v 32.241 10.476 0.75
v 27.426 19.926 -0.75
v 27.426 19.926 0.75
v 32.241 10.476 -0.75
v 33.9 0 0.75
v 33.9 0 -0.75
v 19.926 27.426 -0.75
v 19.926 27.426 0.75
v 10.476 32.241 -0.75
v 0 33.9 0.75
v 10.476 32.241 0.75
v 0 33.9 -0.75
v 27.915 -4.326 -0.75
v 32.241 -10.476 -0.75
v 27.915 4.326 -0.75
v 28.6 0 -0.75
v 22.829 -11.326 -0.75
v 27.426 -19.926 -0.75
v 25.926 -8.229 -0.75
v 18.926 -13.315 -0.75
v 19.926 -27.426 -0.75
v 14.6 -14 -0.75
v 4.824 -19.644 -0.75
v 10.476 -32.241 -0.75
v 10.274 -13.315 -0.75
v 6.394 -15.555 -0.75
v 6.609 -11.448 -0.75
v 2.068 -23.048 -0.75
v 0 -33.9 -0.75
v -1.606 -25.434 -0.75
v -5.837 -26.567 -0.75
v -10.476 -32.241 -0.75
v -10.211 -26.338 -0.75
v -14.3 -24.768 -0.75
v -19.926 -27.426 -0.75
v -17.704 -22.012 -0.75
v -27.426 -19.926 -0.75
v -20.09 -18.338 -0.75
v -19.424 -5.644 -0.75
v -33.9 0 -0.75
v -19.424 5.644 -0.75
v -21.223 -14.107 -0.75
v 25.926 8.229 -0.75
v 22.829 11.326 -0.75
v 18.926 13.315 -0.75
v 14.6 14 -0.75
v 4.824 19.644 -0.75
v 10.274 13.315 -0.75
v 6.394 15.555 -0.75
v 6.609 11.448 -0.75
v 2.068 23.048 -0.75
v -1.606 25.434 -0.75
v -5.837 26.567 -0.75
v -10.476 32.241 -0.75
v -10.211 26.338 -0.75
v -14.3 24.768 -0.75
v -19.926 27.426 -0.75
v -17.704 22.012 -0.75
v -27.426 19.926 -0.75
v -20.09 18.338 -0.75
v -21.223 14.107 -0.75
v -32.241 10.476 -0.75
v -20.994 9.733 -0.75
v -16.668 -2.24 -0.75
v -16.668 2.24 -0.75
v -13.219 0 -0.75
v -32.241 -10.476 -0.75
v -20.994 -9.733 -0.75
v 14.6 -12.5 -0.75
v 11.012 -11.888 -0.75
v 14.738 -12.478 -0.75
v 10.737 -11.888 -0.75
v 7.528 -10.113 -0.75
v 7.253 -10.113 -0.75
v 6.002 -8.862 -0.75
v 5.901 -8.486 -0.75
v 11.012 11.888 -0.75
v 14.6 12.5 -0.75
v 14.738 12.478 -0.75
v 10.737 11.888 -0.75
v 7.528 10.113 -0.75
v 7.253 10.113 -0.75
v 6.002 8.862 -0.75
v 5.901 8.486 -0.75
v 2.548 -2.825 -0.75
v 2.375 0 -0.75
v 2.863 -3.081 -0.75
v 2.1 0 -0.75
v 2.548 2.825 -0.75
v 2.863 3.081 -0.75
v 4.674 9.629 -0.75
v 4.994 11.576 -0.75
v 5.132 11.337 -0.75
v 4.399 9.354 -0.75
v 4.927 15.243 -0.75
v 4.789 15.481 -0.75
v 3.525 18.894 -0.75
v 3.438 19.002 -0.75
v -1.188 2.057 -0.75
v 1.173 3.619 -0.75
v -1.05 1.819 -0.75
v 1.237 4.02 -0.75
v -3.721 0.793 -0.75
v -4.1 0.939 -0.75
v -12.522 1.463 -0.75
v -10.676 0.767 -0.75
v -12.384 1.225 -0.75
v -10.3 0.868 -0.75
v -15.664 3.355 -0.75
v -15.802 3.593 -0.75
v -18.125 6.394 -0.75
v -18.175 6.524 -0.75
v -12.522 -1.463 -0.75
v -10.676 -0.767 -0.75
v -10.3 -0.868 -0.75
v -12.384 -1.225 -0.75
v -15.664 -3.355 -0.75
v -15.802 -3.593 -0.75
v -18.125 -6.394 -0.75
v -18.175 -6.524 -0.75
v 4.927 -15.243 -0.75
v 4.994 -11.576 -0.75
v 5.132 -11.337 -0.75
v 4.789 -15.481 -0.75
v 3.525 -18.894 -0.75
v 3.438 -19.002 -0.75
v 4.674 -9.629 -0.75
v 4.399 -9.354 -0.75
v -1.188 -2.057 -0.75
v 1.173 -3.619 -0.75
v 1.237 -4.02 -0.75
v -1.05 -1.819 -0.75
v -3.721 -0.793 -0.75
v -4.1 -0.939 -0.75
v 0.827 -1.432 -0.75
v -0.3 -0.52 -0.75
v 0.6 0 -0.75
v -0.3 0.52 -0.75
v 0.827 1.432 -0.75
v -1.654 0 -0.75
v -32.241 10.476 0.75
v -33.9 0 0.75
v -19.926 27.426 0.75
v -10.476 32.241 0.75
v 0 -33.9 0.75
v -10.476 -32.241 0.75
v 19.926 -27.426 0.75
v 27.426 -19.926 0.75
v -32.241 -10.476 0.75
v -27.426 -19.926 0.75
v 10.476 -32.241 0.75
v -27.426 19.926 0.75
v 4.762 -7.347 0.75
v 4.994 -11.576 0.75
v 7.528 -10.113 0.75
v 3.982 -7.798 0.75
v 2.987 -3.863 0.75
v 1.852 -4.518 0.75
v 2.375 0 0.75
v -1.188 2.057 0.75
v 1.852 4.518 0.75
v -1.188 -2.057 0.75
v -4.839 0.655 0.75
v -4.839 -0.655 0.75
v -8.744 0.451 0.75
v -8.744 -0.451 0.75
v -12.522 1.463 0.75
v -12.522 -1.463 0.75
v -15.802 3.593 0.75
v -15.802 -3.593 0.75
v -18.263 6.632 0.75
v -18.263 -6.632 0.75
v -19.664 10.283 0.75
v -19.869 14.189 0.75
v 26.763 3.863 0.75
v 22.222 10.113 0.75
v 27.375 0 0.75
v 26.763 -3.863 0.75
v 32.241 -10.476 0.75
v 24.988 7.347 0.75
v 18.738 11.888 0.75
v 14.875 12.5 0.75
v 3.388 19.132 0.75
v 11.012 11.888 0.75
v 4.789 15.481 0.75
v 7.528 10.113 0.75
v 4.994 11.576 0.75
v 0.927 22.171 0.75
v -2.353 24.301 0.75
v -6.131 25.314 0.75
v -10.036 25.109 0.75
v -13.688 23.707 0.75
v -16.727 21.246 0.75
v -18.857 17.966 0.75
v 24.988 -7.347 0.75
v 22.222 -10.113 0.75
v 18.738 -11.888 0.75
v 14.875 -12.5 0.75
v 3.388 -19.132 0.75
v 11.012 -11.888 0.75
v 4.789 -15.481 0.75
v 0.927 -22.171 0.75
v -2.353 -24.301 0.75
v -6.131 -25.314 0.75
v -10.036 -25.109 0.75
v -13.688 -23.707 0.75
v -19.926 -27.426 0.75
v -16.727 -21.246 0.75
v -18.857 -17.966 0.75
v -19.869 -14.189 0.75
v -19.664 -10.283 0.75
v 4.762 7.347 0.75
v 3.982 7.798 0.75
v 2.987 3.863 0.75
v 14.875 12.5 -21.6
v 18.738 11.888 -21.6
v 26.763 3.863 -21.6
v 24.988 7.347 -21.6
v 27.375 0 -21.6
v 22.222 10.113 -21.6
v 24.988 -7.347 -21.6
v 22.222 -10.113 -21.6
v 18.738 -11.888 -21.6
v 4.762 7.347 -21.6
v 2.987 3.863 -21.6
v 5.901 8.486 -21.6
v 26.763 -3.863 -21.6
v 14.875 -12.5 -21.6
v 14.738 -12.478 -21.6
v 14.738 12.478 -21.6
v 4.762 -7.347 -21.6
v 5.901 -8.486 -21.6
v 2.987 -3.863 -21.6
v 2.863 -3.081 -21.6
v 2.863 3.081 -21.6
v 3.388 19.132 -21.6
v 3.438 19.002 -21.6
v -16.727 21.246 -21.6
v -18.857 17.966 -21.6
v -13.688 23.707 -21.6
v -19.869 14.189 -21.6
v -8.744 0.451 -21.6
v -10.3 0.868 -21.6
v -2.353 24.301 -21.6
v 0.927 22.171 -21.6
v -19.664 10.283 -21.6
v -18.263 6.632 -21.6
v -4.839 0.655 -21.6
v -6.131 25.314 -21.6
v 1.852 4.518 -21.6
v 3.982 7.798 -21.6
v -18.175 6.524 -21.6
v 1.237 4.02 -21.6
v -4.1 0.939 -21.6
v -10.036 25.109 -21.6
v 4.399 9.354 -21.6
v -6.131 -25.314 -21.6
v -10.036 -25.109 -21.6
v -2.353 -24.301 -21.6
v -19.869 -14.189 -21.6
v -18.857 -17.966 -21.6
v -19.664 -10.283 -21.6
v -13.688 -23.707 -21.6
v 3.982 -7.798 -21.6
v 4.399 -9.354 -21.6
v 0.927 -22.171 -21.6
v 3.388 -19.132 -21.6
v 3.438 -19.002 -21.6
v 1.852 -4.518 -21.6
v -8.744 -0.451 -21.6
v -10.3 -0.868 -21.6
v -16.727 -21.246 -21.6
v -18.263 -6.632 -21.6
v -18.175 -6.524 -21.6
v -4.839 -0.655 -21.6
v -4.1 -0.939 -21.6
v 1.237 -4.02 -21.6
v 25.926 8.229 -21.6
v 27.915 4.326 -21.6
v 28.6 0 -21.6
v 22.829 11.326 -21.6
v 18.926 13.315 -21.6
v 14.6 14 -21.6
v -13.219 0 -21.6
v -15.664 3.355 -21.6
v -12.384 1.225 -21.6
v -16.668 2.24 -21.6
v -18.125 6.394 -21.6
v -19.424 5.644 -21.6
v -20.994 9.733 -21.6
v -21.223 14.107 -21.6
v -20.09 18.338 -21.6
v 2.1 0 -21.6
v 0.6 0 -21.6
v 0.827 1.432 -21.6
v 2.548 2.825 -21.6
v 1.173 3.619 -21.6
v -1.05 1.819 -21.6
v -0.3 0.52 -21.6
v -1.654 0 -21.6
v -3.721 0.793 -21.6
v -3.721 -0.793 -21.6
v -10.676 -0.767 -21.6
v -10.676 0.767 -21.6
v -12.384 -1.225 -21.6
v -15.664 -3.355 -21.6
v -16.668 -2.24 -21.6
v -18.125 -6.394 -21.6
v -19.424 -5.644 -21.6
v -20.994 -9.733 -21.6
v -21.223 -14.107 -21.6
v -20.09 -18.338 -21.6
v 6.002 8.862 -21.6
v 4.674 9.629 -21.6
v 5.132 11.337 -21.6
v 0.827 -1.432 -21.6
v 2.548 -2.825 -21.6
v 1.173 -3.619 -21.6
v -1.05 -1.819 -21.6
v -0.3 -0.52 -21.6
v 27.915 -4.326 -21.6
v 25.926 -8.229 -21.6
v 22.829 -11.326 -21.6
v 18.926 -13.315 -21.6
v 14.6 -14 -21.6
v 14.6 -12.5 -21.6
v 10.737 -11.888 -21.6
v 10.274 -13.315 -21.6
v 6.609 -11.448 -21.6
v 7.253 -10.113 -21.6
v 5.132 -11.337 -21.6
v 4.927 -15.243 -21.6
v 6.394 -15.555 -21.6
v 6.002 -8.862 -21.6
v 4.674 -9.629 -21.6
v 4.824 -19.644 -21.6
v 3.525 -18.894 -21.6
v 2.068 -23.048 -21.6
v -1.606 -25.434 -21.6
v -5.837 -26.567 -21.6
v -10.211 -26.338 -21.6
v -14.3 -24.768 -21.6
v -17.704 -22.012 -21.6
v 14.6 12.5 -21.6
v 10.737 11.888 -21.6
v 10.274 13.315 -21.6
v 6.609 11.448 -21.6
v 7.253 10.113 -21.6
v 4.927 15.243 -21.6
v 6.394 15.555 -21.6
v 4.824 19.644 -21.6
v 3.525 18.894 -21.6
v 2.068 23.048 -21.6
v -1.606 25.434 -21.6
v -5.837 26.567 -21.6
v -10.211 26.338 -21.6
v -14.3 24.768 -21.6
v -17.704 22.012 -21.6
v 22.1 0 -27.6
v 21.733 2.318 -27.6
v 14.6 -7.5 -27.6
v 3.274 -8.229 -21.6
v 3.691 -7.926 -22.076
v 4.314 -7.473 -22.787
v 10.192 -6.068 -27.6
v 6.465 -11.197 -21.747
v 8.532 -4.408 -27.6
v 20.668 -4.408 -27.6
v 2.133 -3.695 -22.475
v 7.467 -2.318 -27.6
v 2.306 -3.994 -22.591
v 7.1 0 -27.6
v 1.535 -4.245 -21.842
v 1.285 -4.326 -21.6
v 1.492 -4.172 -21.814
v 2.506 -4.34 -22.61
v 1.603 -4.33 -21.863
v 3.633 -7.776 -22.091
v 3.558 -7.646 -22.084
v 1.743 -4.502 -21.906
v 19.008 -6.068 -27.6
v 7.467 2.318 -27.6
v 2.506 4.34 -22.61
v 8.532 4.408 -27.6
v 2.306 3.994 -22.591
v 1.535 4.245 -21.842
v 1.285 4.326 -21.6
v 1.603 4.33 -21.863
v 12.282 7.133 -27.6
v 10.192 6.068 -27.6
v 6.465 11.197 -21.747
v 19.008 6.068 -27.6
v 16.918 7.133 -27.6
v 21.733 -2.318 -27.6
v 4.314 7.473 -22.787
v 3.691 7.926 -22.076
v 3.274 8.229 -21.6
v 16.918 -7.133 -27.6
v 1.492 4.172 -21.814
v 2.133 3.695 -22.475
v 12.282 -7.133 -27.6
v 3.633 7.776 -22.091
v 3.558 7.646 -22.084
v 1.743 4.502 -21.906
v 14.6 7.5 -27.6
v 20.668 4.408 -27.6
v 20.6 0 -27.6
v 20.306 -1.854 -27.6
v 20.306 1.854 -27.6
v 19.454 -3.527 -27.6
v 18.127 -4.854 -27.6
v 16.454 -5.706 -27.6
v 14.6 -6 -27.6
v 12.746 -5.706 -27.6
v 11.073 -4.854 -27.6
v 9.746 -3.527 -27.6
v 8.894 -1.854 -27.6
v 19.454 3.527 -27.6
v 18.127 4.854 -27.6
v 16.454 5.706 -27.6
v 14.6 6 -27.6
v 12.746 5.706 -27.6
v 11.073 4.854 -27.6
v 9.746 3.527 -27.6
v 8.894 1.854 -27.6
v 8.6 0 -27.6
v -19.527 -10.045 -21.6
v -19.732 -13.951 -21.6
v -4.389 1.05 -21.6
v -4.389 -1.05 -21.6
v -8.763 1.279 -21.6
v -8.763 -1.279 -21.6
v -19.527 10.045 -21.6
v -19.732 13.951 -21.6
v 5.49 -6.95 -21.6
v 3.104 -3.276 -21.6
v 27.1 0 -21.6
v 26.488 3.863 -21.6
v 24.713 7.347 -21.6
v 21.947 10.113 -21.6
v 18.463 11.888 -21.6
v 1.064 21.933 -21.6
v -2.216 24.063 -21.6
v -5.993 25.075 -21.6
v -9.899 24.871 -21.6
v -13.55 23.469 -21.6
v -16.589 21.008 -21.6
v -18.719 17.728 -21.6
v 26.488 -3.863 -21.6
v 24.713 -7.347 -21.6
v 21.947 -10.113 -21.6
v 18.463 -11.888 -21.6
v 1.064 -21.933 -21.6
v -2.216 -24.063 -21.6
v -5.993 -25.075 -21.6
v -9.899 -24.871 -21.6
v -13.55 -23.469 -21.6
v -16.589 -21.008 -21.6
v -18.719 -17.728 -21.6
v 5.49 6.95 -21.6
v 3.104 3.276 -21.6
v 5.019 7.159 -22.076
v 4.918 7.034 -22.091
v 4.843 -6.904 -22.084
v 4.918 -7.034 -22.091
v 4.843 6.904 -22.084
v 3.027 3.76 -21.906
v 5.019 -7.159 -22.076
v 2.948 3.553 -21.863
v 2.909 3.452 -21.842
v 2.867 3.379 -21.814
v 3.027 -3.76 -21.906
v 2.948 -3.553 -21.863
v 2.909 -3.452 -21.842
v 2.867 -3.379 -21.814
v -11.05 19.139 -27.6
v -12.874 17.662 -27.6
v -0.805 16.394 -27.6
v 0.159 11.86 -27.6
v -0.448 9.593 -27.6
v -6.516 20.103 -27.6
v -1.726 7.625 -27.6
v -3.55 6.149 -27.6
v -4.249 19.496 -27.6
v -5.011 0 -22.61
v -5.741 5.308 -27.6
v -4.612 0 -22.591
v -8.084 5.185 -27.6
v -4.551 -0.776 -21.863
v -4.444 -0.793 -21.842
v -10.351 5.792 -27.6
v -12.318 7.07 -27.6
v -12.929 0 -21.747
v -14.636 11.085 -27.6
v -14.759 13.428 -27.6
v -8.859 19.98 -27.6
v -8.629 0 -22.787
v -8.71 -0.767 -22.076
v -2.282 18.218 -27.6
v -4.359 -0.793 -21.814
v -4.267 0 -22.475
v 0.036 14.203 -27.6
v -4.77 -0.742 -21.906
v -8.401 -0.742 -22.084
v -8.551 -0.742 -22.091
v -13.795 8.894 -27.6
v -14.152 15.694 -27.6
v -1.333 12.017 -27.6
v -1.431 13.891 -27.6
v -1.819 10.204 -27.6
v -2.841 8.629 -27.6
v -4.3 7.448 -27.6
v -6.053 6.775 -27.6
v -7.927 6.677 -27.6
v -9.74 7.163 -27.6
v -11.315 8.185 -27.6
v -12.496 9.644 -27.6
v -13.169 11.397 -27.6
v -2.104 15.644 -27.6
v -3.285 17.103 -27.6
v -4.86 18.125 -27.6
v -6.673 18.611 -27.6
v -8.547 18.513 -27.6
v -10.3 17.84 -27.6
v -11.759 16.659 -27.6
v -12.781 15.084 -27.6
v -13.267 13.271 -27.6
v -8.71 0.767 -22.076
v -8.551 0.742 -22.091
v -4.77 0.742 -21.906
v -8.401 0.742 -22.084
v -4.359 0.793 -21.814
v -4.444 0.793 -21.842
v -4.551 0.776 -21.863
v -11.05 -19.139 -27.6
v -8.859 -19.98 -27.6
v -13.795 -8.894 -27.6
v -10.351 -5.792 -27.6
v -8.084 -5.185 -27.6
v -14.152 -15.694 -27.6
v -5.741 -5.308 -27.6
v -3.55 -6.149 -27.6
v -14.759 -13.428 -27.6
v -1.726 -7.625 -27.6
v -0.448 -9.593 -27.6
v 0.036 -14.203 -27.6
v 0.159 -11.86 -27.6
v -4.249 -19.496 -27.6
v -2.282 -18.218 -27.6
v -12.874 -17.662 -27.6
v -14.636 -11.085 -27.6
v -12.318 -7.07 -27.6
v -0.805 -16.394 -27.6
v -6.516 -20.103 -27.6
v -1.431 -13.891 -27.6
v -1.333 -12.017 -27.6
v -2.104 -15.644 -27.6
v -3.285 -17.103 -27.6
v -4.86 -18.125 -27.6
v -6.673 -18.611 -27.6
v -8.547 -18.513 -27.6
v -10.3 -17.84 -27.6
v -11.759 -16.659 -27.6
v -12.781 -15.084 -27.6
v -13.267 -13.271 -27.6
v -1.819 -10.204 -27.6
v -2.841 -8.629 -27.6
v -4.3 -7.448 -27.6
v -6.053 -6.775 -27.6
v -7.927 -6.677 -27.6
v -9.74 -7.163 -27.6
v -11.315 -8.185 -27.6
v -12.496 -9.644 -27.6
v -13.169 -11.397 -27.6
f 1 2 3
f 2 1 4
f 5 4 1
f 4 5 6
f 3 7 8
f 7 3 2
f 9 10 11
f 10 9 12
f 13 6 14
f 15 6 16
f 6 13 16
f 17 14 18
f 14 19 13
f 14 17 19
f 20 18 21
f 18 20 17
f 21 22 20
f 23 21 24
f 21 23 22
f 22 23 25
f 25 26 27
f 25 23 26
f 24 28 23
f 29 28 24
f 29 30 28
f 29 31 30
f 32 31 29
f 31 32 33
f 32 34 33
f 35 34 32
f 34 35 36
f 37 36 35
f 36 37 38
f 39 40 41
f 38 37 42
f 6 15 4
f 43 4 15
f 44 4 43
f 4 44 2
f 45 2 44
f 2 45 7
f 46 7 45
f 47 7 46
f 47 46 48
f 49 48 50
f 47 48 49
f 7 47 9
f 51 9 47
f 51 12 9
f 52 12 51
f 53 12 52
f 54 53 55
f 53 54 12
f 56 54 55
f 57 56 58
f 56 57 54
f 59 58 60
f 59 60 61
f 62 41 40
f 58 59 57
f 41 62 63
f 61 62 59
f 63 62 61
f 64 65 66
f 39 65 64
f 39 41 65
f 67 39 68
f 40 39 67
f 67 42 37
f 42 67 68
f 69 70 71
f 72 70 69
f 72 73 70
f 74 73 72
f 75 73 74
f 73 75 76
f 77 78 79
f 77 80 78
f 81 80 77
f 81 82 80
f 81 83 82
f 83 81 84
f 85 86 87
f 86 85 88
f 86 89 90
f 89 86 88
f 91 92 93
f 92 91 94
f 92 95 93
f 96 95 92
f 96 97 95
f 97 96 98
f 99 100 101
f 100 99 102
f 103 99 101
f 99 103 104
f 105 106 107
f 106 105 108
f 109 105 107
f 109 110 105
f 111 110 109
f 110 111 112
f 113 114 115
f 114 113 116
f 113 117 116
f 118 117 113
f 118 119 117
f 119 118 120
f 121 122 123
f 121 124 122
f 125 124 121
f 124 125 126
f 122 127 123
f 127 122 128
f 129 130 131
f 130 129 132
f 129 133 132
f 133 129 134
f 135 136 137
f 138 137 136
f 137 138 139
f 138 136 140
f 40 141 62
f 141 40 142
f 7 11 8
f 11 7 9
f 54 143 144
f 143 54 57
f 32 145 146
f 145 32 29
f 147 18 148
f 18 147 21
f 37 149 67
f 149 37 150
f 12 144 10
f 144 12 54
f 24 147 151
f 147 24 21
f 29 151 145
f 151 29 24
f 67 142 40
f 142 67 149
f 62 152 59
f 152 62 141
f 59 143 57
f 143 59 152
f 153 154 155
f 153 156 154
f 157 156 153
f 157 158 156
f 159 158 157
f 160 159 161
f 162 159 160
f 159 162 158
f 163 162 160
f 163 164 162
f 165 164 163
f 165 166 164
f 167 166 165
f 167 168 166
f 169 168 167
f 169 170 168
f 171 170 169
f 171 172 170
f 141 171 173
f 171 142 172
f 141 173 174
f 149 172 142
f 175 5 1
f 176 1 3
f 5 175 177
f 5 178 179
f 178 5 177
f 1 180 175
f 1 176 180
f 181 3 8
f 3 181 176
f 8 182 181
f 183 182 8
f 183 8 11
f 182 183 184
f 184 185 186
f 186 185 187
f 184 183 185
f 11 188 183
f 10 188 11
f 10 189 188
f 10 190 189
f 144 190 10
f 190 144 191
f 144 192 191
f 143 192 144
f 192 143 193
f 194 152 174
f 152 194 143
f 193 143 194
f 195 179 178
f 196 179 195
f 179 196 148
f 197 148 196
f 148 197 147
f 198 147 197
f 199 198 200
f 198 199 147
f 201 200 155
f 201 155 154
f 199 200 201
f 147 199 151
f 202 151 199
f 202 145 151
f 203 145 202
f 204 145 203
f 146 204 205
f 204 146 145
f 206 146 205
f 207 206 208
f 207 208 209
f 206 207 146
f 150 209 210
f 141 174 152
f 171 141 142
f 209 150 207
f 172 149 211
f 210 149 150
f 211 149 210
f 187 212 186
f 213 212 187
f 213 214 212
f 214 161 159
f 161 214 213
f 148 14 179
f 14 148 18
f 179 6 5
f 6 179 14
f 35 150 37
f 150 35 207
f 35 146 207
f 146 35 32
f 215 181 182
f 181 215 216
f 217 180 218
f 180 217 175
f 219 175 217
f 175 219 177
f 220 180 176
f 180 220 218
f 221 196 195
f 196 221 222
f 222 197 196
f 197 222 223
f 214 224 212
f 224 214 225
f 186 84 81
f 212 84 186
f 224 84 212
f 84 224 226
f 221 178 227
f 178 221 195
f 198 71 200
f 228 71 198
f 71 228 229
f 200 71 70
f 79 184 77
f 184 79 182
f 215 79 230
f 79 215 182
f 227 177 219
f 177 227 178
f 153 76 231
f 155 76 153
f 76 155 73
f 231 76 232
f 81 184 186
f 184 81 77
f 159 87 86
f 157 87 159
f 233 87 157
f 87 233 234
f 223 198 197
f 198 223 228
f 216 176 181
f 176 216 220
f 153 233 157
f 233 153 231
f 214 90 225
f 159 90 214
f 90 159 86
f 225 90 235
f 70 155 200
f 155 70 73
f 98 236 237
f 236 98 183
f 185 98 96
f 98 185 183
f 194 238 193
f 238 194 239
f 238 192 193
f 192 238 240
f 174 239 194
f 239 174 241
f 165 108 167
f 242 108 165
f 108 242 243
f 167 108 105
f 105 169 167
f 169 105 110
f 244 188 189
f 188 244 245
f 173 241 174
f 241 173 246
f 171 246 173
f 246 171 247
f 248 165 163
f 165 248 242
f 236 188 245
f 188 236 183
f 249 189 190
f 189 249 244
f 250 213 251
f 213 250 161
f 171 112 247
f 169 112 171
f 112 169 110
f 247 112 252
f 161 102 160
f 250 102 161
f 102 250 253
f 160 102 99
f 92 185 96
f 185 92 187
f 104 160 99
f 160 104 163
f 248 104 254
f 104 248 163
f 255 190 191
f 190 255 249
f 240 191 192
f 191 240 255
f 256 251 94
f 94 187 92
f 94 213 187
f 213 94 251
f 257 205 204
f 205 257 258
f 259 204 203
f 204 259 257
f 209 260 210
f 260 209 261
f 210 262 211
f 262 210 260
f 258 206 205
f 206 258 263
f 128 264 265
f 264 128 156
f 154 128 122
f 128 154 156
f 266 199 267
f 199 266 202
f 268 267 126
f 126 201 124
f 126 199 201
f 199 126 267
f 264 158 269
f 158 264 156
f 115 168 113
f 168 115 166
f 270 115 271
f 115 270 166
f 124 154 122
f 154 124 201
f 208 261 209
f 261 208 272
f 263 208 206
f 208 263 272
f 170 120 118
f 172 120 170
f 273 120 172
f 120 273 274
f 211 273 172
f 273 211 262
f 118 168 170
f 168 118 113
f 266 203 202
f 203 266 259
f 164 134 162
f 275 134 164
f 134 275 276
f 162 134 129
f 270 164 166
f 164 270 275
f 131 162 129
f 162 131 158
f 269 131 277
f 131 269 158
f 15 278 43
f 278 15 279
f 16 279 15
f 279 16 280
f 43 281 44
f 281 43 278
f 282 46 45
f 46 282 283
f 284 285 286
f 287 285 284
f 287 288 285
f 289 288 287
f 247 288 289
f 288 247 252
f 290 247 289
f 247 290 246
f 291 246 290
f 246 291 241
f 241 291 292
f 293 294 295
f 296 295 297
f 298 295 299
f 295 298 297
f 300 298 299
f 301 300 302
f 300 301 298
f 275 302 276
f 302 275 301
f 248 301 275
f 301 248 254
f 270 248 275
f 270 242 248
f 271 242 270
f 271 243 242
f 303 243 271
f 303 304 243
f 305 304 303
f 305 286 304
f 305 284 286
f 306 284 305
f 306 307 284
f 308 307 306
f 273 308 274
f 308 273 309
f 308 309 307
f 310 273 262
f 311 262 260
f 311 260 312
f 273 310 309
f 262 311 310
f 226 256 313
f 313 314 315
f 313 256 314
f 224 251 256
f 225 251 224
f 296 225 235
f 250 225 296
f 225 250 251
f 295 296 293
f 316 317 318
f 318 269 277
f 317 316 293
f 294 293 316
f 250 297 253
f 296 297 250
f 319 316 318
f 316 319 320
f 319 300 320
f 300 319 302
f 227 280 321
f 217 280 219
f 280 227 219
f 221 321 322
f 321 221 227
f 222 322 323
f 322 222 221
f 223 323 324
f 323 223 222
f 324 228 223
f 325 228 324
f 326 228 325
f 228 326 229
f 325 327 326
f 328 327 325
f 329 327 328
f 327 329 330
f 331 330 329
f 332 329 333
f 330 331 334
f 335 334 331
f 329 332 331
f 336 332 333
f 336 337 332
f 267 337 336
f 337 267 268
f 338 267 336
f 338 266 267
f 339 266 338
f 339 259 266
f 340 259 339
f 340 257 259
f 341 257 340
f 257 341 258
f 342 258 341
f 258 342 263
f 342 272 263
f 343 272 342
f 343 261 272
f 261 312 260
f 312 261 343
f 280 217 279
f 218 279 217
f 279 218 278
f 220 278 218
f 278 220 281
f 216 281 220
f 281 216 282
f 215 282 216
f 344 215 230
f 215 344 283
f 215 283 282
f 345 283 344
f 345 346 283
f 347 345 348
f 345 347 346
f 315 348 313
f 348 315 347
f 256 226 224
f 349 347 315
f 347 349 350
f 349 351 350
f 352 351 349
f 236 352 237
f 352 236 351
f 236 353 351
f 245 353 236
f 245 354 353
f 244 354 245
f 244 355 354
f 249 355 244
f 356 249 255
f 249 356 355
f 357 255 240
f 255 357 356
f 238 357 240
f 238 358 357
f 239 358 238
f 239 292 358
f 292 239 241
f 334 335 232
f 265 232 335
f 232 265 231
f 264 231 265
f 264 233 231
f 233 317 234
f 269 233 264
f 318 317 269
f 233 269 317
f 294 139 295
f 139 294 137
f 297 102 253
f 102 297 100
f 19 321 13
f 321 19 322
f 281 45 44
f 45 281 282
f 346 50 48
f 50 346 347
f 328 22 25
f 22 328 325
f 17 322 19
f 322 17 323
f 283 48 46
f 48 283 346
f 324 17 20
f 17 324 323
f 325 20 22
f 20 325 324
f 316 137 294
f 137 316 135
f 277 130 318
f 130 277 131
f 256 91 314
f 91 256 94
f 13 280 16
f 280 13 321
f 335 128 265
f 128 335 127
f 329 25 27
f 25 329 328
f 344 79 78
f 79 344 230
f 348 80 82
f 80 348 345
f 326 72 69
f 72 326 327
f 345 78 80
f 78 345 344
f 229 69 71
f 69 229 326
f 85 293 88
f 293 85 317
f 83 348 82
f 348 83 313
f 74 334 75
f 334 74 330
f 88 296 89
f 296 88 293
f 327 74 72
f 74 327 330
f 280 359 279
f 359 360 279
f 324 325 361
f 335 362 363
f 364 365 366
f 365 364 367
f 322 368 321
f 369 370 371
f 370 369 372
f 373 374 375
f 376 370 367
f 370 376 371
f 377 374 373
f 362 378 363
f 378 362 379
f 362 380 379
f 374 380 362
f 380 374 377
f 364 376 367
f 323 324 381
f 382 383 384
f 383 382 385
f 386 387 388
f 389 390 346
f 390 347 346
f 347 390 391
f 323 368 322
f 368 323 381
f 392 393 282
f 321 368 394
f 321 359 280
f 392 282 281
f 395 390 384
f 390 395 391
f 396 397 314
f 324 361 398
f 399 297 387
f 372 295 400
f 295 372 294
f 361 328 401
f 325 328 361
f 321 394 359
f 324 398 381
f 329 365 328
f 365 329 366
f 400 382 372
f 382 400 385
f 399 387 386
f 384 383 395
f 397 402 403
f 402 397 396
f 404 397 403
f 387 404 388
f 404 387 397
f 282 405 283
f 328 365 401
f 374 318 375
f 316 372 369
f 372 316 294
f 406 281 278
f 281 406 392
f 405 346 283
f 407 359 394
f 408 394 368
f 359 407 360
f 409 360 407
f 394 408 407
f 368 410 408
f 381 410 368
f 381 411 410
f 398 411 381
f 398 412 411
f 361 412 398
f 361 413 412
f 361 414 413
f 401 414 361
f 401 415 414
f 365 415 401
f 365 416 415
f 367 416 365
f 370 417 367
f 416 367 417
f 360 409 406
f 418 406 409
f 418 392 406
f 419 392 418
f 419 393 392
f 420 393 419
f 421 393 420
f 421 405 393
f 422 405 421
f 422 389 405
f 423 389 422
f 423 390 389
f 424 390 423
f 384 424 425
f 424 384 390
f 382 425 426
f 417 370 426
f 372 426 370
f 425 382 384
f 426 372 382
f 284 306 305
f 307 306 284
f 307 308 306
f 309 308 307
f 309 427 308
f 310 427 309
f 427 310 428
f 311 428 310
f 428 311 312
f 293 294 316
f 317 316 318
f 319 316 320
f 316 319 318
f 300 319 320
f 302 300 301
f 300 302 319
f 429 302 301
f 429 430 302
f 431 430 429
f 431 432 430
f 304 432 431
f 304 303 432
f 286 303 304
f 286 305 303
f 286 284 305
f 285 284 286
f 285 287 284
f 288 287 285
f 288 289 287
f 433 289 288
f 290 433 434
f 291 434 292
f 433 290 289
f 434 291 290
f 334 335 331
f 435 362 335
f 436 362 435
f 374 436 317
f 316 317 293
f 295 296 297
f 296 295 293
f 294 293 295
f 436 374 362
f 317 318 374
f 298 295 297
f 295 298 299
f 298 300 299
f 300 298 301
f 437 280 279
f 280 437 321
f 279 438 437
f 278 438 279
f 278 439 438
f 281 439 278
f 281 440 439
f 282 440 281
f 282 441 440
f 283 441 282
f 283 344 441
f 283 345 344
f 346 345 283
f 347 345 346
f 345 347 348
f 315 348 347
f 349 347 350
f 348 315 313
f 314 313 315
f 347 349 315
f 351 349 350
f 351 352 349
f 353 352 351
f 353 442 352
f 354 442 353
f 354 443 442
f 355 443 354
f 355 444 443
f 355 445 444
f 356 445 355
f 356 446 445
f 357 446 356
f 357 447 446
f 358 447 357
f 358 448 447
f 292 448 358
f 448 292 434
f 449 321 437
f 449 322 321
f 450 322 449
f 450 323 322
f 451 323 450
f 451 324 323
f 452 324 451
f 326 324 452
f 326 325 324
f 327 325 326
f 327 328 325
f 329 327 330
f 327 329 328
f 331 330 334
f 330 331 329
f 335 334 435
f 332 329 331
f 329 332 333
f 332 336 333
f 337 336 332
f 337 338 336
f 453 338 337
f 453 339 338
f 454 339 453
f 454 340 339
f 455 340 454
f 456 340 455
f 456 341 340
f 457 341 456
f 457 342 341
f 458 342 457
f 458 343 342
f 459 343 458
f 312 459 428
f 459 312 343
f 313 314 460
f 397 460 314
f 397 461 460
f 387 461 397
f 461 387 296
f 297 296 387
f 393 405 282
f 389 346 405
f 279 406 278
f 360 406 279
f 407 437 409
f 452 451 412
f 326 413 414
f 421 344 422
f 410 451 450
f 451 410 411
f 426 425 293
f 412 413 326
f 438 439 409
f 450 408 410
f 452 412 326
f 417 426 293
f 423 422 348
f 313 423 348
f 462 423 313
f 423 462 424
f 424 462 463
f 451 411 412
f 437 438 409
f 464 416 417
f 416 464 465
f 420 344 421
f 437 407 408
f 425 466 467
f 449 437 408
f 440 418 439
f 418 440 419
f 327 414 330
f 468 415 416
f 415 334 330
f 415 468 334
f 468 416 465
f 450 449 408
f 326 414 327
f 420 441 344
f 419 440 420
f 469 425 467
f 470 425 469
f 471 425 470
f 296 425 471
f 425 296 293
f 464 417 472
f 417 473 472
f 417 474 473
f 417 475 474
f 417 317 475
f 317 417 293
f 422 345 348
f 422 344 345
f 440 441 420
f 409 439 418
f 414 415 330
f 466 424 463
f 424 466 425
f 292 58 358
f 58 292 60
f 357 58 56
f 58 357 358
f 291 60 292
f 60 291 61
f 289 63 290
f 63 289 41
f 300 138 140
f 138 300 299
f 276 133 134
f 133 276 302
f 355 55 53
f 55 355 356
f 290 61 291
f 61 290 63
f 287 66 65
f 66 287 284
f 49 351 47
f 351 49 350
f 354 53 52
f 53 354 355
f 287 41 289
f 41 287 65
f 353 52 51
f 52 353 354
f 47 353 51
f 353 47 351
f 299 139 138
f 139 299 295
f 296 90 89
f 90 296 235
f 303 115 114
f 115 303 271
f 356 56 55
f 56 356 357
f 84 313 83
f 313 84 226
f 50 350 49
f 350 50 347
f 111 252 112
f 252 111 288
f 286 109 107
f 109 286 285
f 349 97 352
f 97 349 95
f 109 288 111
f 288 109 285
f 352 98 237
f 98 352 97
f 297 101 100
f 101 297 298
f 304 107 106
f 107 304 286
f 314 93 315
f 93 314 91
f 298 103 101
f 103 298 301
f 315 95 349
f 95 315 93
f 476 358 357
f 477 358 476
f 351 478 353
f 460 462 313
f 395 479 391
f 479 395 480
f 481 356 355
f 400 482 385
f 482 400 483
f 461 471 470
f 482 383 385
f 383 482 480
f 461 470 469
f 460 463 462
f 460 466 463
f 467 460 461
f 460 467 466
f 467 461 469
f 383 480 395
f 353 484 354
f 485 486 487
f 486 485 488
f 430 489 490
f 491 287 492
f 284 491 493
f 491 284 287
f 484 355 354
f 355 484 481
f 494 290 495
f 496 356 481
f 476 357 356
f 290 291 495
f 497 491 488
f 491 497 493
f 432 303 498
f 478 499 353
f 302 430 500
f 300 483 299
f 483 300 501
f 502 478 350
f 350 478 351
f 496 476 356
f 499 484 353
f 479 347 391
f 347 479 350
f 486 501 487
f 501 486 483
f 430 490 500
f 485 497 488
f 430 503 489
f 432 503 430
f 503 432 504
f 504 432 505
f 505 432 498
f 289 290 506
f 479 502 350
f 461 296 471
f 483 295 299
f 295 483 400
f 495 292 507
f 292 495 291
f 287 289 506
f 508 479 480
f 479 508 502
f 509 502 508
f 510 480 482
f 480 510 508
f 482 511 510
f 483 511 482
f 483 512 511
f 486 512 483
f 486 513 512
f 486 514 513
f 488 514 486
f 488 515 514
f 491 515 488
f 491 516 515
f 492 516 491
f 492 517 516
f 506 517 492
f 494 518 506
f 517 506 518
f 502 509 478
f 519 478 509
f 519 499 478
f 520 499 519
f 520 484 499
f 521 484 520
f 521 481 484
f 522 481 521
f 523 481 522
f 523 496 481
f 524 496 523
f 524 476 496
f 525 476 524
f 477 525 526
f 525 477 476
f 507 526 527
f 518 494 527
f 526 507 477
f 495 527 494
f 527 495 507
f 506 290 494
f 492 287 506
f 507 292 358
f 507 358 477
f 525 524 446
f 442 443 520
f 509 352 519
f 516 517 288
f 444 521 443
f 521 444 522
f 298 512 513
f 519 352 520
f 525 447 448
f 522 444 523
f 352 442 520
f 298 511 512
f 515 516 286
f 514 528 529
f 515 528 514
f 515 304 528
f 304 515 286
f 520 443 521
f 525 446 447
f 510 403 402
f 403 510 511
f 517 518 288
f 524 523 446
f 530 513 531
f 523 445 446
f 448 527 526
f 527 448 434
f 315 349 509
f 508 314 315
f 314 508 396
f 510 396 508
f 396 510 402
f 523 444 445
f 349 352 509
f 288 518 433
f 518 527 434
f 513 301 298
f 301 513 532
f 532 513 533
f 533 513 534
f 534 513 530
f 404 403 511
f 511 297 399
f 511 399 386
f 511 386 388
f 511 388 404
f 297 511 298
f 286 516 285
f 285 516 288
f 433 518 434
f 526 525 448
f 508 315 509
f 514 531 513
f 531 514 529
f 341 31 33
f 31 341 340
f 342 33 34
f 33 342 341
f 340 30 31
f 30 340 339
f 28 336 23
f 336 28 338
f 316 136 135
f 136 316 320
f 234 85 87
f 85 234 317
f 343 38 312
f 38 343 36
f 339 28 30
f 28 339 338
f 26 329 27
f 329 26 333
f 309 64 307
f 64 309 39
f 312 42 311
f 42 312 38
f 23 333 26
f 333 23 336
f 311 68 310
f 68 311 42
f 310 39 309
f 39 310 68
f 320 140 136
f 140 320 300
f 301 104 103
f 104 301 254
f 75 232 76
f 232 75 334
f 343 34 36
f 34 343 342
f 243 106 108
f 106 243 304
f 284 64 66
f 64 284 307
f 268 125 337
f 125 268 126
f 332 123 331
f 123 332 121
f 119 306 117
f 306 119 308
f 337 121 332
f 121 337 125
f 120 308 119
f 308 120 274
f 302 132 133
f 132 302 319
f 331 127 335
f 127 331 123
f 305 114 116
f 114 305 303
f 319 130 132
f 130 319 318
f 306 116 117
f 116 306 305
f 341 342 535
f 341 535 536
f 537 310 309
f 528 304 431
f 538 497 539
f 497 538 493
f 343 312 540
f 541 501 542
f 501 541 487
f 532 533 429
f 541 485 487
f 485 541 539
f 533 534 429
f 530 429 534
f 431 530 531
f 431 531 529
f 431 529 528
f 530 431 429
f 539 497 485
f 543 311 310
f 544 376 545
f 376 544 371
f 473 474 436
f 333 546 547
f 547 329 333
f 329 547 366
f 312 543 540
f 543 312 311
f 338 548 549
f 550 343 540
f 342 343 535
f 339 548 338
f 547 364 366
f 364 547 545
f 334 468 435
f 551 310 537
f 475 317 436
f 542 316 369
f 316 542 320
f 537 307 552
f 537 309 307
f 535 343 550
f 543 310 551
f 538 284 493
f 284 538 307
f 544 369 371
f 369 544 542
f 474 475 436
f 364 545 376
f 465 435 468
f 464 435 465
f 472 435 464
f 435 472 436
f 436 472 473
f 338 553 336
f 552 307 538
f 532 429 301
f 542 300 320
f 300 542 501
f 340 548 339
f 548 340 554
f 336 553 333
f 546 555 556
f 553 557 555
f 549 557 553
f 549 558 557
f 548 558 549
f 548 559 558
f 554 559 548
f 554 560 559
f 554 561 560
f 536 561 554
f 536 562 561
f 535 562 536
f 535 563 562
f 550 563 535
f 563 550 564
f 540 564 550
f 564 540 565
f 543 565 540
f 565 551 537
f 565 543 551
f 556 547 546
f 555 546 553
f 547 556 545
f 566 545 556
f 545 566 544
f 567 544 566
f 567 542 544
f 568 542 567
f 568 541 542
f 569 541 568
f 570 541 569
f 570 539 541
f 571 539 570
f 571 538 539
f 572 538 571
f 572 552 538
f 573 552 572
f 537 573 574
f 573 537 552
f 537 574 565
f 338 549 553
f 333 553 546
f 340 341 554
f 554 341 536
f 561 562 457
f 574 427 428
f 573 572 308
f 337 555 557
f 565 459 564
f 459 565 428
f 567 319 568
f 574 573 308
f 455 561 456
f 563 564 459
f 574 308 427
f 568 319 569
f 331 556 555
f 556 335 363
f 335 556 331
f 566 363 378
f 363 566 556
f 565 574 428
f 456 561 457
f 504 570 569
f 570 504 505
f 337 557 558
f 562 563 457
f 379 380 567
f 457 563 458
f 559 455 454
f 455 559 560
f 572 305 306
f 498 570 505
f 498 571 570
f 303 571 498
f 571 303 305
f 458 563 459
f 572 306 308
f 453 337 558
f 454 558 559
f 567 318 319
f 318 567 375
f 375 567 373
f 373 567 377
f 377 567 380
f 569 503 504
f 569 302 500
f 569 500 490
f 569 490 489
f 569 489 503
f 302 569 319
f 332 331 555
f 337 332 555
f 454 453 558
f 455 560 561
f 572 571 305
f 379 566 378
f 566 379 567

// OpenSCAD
$fn=20;     // =20 for preview, =200 for rendering/printing
id=57.5;    // Inner Diameter (at least 56.75)
ed=67.8;    // Exterior Diameter (>= id)


//cylinder(h = 30, d =70, center = true);
//translate([0, 0, -10.8]) color([1,0,0]) cylinder(h = 23.1, d = 4.5, center = true); // fill the hole!!
shift=(id-28.3)/2;
difference() {
    group() {
        difference() {
            cylinder(h = 1.5, d = ed, center = true);
            rotate (0) translate([14.875, 0,0]) cylinder(h = 1.5, d = 25, center = true);
            rotate (120) translate([14.875, 0, 0]) cylinder(h = 1.5, d = 25, center = true);
            rotate (240) translate([14.875, 0, 0]) cylinder(h = 1.5, d = 25, center = true);
        }

    rotate(0) translate([shift, 0, -10.8]) {
    difference() {
        color([1,0,0]) cylinder(h = 21.6, d = 28, center = true);
        translate([0, 0, 0]) {
            color([0,1,0]) cylinder(h = 21.6, d = 25, center = true);
        }
        translate([0, 0, 1.5]) {
            color([0,0,1]) cylinder(h = 40, d = 15, center = true);
        }
    }
    color([1,1,1]) translate([0, 0, -13.8]) {
        difference() {
            cylinder(h=6, r1=7.5, r2=14, center=true);
            cylinder(h=6, r1=6, r2=12.5, center=true);
        }
    }
    }

    rotate(120) translate([shift, 0, -10.8]) {
    difference() {
        color([1,0,0]) cylinder(h = 21.6, d = 28, center = true);
        translate([0, 0, 0]) {
            color([0,1,0]) cylinder(h = 21.6, d = 25, center = true);
        }
        translate([0, 0, 1.5]) {
            color([0,0,1]) cylinder(h = 40, d = 15, center = true);
        }
    }
    color([1,1,1]) translate([0, 0, -13.8]) {
        difference() {
            cylinder(h=6, r1=7.5, r2=14, center=true);
            cylinder(h=6, r1=6, r2=12.5, center=true);
        }
    }
    }

    rotate(240) translate([shift, 0, -10.8]) {
    difference() {
        color([1,0,0]) cylinder(h = 21.6, d = 28, center = true);
        translate([0, 0, 0]) {
            color([0,1,0]) cylinder(h = 21.6, d = 25, center = true);
        }
        translate([0, 0, 1.5]) {
            color([0,0,1]) cylinder(h = 40, d = 15, center = true);
        }
    }
    color([1,1,1]) translate([0, 0, -13.8]) {
        difference() {
            cylinder(h=6, r1=7.5, r2=14, center=true);
            cylinder(h=6, r1=6, r2=12.5, center=true);
        }
    }
    }
    }
    rotate (0)   translate([shift+0.275, 0, -10.8])  cylinder(h = 21.6, d = 25, center = true);
    rotate (120) translate([shift+0.275, 0, -10.8]) cylinder(h = 21.6, d = 25, center = true);
    rotate (240) translate([shift+0.275, 0, -10.8]) cylinder(h = 21.6, d = 25, center = true);
}
